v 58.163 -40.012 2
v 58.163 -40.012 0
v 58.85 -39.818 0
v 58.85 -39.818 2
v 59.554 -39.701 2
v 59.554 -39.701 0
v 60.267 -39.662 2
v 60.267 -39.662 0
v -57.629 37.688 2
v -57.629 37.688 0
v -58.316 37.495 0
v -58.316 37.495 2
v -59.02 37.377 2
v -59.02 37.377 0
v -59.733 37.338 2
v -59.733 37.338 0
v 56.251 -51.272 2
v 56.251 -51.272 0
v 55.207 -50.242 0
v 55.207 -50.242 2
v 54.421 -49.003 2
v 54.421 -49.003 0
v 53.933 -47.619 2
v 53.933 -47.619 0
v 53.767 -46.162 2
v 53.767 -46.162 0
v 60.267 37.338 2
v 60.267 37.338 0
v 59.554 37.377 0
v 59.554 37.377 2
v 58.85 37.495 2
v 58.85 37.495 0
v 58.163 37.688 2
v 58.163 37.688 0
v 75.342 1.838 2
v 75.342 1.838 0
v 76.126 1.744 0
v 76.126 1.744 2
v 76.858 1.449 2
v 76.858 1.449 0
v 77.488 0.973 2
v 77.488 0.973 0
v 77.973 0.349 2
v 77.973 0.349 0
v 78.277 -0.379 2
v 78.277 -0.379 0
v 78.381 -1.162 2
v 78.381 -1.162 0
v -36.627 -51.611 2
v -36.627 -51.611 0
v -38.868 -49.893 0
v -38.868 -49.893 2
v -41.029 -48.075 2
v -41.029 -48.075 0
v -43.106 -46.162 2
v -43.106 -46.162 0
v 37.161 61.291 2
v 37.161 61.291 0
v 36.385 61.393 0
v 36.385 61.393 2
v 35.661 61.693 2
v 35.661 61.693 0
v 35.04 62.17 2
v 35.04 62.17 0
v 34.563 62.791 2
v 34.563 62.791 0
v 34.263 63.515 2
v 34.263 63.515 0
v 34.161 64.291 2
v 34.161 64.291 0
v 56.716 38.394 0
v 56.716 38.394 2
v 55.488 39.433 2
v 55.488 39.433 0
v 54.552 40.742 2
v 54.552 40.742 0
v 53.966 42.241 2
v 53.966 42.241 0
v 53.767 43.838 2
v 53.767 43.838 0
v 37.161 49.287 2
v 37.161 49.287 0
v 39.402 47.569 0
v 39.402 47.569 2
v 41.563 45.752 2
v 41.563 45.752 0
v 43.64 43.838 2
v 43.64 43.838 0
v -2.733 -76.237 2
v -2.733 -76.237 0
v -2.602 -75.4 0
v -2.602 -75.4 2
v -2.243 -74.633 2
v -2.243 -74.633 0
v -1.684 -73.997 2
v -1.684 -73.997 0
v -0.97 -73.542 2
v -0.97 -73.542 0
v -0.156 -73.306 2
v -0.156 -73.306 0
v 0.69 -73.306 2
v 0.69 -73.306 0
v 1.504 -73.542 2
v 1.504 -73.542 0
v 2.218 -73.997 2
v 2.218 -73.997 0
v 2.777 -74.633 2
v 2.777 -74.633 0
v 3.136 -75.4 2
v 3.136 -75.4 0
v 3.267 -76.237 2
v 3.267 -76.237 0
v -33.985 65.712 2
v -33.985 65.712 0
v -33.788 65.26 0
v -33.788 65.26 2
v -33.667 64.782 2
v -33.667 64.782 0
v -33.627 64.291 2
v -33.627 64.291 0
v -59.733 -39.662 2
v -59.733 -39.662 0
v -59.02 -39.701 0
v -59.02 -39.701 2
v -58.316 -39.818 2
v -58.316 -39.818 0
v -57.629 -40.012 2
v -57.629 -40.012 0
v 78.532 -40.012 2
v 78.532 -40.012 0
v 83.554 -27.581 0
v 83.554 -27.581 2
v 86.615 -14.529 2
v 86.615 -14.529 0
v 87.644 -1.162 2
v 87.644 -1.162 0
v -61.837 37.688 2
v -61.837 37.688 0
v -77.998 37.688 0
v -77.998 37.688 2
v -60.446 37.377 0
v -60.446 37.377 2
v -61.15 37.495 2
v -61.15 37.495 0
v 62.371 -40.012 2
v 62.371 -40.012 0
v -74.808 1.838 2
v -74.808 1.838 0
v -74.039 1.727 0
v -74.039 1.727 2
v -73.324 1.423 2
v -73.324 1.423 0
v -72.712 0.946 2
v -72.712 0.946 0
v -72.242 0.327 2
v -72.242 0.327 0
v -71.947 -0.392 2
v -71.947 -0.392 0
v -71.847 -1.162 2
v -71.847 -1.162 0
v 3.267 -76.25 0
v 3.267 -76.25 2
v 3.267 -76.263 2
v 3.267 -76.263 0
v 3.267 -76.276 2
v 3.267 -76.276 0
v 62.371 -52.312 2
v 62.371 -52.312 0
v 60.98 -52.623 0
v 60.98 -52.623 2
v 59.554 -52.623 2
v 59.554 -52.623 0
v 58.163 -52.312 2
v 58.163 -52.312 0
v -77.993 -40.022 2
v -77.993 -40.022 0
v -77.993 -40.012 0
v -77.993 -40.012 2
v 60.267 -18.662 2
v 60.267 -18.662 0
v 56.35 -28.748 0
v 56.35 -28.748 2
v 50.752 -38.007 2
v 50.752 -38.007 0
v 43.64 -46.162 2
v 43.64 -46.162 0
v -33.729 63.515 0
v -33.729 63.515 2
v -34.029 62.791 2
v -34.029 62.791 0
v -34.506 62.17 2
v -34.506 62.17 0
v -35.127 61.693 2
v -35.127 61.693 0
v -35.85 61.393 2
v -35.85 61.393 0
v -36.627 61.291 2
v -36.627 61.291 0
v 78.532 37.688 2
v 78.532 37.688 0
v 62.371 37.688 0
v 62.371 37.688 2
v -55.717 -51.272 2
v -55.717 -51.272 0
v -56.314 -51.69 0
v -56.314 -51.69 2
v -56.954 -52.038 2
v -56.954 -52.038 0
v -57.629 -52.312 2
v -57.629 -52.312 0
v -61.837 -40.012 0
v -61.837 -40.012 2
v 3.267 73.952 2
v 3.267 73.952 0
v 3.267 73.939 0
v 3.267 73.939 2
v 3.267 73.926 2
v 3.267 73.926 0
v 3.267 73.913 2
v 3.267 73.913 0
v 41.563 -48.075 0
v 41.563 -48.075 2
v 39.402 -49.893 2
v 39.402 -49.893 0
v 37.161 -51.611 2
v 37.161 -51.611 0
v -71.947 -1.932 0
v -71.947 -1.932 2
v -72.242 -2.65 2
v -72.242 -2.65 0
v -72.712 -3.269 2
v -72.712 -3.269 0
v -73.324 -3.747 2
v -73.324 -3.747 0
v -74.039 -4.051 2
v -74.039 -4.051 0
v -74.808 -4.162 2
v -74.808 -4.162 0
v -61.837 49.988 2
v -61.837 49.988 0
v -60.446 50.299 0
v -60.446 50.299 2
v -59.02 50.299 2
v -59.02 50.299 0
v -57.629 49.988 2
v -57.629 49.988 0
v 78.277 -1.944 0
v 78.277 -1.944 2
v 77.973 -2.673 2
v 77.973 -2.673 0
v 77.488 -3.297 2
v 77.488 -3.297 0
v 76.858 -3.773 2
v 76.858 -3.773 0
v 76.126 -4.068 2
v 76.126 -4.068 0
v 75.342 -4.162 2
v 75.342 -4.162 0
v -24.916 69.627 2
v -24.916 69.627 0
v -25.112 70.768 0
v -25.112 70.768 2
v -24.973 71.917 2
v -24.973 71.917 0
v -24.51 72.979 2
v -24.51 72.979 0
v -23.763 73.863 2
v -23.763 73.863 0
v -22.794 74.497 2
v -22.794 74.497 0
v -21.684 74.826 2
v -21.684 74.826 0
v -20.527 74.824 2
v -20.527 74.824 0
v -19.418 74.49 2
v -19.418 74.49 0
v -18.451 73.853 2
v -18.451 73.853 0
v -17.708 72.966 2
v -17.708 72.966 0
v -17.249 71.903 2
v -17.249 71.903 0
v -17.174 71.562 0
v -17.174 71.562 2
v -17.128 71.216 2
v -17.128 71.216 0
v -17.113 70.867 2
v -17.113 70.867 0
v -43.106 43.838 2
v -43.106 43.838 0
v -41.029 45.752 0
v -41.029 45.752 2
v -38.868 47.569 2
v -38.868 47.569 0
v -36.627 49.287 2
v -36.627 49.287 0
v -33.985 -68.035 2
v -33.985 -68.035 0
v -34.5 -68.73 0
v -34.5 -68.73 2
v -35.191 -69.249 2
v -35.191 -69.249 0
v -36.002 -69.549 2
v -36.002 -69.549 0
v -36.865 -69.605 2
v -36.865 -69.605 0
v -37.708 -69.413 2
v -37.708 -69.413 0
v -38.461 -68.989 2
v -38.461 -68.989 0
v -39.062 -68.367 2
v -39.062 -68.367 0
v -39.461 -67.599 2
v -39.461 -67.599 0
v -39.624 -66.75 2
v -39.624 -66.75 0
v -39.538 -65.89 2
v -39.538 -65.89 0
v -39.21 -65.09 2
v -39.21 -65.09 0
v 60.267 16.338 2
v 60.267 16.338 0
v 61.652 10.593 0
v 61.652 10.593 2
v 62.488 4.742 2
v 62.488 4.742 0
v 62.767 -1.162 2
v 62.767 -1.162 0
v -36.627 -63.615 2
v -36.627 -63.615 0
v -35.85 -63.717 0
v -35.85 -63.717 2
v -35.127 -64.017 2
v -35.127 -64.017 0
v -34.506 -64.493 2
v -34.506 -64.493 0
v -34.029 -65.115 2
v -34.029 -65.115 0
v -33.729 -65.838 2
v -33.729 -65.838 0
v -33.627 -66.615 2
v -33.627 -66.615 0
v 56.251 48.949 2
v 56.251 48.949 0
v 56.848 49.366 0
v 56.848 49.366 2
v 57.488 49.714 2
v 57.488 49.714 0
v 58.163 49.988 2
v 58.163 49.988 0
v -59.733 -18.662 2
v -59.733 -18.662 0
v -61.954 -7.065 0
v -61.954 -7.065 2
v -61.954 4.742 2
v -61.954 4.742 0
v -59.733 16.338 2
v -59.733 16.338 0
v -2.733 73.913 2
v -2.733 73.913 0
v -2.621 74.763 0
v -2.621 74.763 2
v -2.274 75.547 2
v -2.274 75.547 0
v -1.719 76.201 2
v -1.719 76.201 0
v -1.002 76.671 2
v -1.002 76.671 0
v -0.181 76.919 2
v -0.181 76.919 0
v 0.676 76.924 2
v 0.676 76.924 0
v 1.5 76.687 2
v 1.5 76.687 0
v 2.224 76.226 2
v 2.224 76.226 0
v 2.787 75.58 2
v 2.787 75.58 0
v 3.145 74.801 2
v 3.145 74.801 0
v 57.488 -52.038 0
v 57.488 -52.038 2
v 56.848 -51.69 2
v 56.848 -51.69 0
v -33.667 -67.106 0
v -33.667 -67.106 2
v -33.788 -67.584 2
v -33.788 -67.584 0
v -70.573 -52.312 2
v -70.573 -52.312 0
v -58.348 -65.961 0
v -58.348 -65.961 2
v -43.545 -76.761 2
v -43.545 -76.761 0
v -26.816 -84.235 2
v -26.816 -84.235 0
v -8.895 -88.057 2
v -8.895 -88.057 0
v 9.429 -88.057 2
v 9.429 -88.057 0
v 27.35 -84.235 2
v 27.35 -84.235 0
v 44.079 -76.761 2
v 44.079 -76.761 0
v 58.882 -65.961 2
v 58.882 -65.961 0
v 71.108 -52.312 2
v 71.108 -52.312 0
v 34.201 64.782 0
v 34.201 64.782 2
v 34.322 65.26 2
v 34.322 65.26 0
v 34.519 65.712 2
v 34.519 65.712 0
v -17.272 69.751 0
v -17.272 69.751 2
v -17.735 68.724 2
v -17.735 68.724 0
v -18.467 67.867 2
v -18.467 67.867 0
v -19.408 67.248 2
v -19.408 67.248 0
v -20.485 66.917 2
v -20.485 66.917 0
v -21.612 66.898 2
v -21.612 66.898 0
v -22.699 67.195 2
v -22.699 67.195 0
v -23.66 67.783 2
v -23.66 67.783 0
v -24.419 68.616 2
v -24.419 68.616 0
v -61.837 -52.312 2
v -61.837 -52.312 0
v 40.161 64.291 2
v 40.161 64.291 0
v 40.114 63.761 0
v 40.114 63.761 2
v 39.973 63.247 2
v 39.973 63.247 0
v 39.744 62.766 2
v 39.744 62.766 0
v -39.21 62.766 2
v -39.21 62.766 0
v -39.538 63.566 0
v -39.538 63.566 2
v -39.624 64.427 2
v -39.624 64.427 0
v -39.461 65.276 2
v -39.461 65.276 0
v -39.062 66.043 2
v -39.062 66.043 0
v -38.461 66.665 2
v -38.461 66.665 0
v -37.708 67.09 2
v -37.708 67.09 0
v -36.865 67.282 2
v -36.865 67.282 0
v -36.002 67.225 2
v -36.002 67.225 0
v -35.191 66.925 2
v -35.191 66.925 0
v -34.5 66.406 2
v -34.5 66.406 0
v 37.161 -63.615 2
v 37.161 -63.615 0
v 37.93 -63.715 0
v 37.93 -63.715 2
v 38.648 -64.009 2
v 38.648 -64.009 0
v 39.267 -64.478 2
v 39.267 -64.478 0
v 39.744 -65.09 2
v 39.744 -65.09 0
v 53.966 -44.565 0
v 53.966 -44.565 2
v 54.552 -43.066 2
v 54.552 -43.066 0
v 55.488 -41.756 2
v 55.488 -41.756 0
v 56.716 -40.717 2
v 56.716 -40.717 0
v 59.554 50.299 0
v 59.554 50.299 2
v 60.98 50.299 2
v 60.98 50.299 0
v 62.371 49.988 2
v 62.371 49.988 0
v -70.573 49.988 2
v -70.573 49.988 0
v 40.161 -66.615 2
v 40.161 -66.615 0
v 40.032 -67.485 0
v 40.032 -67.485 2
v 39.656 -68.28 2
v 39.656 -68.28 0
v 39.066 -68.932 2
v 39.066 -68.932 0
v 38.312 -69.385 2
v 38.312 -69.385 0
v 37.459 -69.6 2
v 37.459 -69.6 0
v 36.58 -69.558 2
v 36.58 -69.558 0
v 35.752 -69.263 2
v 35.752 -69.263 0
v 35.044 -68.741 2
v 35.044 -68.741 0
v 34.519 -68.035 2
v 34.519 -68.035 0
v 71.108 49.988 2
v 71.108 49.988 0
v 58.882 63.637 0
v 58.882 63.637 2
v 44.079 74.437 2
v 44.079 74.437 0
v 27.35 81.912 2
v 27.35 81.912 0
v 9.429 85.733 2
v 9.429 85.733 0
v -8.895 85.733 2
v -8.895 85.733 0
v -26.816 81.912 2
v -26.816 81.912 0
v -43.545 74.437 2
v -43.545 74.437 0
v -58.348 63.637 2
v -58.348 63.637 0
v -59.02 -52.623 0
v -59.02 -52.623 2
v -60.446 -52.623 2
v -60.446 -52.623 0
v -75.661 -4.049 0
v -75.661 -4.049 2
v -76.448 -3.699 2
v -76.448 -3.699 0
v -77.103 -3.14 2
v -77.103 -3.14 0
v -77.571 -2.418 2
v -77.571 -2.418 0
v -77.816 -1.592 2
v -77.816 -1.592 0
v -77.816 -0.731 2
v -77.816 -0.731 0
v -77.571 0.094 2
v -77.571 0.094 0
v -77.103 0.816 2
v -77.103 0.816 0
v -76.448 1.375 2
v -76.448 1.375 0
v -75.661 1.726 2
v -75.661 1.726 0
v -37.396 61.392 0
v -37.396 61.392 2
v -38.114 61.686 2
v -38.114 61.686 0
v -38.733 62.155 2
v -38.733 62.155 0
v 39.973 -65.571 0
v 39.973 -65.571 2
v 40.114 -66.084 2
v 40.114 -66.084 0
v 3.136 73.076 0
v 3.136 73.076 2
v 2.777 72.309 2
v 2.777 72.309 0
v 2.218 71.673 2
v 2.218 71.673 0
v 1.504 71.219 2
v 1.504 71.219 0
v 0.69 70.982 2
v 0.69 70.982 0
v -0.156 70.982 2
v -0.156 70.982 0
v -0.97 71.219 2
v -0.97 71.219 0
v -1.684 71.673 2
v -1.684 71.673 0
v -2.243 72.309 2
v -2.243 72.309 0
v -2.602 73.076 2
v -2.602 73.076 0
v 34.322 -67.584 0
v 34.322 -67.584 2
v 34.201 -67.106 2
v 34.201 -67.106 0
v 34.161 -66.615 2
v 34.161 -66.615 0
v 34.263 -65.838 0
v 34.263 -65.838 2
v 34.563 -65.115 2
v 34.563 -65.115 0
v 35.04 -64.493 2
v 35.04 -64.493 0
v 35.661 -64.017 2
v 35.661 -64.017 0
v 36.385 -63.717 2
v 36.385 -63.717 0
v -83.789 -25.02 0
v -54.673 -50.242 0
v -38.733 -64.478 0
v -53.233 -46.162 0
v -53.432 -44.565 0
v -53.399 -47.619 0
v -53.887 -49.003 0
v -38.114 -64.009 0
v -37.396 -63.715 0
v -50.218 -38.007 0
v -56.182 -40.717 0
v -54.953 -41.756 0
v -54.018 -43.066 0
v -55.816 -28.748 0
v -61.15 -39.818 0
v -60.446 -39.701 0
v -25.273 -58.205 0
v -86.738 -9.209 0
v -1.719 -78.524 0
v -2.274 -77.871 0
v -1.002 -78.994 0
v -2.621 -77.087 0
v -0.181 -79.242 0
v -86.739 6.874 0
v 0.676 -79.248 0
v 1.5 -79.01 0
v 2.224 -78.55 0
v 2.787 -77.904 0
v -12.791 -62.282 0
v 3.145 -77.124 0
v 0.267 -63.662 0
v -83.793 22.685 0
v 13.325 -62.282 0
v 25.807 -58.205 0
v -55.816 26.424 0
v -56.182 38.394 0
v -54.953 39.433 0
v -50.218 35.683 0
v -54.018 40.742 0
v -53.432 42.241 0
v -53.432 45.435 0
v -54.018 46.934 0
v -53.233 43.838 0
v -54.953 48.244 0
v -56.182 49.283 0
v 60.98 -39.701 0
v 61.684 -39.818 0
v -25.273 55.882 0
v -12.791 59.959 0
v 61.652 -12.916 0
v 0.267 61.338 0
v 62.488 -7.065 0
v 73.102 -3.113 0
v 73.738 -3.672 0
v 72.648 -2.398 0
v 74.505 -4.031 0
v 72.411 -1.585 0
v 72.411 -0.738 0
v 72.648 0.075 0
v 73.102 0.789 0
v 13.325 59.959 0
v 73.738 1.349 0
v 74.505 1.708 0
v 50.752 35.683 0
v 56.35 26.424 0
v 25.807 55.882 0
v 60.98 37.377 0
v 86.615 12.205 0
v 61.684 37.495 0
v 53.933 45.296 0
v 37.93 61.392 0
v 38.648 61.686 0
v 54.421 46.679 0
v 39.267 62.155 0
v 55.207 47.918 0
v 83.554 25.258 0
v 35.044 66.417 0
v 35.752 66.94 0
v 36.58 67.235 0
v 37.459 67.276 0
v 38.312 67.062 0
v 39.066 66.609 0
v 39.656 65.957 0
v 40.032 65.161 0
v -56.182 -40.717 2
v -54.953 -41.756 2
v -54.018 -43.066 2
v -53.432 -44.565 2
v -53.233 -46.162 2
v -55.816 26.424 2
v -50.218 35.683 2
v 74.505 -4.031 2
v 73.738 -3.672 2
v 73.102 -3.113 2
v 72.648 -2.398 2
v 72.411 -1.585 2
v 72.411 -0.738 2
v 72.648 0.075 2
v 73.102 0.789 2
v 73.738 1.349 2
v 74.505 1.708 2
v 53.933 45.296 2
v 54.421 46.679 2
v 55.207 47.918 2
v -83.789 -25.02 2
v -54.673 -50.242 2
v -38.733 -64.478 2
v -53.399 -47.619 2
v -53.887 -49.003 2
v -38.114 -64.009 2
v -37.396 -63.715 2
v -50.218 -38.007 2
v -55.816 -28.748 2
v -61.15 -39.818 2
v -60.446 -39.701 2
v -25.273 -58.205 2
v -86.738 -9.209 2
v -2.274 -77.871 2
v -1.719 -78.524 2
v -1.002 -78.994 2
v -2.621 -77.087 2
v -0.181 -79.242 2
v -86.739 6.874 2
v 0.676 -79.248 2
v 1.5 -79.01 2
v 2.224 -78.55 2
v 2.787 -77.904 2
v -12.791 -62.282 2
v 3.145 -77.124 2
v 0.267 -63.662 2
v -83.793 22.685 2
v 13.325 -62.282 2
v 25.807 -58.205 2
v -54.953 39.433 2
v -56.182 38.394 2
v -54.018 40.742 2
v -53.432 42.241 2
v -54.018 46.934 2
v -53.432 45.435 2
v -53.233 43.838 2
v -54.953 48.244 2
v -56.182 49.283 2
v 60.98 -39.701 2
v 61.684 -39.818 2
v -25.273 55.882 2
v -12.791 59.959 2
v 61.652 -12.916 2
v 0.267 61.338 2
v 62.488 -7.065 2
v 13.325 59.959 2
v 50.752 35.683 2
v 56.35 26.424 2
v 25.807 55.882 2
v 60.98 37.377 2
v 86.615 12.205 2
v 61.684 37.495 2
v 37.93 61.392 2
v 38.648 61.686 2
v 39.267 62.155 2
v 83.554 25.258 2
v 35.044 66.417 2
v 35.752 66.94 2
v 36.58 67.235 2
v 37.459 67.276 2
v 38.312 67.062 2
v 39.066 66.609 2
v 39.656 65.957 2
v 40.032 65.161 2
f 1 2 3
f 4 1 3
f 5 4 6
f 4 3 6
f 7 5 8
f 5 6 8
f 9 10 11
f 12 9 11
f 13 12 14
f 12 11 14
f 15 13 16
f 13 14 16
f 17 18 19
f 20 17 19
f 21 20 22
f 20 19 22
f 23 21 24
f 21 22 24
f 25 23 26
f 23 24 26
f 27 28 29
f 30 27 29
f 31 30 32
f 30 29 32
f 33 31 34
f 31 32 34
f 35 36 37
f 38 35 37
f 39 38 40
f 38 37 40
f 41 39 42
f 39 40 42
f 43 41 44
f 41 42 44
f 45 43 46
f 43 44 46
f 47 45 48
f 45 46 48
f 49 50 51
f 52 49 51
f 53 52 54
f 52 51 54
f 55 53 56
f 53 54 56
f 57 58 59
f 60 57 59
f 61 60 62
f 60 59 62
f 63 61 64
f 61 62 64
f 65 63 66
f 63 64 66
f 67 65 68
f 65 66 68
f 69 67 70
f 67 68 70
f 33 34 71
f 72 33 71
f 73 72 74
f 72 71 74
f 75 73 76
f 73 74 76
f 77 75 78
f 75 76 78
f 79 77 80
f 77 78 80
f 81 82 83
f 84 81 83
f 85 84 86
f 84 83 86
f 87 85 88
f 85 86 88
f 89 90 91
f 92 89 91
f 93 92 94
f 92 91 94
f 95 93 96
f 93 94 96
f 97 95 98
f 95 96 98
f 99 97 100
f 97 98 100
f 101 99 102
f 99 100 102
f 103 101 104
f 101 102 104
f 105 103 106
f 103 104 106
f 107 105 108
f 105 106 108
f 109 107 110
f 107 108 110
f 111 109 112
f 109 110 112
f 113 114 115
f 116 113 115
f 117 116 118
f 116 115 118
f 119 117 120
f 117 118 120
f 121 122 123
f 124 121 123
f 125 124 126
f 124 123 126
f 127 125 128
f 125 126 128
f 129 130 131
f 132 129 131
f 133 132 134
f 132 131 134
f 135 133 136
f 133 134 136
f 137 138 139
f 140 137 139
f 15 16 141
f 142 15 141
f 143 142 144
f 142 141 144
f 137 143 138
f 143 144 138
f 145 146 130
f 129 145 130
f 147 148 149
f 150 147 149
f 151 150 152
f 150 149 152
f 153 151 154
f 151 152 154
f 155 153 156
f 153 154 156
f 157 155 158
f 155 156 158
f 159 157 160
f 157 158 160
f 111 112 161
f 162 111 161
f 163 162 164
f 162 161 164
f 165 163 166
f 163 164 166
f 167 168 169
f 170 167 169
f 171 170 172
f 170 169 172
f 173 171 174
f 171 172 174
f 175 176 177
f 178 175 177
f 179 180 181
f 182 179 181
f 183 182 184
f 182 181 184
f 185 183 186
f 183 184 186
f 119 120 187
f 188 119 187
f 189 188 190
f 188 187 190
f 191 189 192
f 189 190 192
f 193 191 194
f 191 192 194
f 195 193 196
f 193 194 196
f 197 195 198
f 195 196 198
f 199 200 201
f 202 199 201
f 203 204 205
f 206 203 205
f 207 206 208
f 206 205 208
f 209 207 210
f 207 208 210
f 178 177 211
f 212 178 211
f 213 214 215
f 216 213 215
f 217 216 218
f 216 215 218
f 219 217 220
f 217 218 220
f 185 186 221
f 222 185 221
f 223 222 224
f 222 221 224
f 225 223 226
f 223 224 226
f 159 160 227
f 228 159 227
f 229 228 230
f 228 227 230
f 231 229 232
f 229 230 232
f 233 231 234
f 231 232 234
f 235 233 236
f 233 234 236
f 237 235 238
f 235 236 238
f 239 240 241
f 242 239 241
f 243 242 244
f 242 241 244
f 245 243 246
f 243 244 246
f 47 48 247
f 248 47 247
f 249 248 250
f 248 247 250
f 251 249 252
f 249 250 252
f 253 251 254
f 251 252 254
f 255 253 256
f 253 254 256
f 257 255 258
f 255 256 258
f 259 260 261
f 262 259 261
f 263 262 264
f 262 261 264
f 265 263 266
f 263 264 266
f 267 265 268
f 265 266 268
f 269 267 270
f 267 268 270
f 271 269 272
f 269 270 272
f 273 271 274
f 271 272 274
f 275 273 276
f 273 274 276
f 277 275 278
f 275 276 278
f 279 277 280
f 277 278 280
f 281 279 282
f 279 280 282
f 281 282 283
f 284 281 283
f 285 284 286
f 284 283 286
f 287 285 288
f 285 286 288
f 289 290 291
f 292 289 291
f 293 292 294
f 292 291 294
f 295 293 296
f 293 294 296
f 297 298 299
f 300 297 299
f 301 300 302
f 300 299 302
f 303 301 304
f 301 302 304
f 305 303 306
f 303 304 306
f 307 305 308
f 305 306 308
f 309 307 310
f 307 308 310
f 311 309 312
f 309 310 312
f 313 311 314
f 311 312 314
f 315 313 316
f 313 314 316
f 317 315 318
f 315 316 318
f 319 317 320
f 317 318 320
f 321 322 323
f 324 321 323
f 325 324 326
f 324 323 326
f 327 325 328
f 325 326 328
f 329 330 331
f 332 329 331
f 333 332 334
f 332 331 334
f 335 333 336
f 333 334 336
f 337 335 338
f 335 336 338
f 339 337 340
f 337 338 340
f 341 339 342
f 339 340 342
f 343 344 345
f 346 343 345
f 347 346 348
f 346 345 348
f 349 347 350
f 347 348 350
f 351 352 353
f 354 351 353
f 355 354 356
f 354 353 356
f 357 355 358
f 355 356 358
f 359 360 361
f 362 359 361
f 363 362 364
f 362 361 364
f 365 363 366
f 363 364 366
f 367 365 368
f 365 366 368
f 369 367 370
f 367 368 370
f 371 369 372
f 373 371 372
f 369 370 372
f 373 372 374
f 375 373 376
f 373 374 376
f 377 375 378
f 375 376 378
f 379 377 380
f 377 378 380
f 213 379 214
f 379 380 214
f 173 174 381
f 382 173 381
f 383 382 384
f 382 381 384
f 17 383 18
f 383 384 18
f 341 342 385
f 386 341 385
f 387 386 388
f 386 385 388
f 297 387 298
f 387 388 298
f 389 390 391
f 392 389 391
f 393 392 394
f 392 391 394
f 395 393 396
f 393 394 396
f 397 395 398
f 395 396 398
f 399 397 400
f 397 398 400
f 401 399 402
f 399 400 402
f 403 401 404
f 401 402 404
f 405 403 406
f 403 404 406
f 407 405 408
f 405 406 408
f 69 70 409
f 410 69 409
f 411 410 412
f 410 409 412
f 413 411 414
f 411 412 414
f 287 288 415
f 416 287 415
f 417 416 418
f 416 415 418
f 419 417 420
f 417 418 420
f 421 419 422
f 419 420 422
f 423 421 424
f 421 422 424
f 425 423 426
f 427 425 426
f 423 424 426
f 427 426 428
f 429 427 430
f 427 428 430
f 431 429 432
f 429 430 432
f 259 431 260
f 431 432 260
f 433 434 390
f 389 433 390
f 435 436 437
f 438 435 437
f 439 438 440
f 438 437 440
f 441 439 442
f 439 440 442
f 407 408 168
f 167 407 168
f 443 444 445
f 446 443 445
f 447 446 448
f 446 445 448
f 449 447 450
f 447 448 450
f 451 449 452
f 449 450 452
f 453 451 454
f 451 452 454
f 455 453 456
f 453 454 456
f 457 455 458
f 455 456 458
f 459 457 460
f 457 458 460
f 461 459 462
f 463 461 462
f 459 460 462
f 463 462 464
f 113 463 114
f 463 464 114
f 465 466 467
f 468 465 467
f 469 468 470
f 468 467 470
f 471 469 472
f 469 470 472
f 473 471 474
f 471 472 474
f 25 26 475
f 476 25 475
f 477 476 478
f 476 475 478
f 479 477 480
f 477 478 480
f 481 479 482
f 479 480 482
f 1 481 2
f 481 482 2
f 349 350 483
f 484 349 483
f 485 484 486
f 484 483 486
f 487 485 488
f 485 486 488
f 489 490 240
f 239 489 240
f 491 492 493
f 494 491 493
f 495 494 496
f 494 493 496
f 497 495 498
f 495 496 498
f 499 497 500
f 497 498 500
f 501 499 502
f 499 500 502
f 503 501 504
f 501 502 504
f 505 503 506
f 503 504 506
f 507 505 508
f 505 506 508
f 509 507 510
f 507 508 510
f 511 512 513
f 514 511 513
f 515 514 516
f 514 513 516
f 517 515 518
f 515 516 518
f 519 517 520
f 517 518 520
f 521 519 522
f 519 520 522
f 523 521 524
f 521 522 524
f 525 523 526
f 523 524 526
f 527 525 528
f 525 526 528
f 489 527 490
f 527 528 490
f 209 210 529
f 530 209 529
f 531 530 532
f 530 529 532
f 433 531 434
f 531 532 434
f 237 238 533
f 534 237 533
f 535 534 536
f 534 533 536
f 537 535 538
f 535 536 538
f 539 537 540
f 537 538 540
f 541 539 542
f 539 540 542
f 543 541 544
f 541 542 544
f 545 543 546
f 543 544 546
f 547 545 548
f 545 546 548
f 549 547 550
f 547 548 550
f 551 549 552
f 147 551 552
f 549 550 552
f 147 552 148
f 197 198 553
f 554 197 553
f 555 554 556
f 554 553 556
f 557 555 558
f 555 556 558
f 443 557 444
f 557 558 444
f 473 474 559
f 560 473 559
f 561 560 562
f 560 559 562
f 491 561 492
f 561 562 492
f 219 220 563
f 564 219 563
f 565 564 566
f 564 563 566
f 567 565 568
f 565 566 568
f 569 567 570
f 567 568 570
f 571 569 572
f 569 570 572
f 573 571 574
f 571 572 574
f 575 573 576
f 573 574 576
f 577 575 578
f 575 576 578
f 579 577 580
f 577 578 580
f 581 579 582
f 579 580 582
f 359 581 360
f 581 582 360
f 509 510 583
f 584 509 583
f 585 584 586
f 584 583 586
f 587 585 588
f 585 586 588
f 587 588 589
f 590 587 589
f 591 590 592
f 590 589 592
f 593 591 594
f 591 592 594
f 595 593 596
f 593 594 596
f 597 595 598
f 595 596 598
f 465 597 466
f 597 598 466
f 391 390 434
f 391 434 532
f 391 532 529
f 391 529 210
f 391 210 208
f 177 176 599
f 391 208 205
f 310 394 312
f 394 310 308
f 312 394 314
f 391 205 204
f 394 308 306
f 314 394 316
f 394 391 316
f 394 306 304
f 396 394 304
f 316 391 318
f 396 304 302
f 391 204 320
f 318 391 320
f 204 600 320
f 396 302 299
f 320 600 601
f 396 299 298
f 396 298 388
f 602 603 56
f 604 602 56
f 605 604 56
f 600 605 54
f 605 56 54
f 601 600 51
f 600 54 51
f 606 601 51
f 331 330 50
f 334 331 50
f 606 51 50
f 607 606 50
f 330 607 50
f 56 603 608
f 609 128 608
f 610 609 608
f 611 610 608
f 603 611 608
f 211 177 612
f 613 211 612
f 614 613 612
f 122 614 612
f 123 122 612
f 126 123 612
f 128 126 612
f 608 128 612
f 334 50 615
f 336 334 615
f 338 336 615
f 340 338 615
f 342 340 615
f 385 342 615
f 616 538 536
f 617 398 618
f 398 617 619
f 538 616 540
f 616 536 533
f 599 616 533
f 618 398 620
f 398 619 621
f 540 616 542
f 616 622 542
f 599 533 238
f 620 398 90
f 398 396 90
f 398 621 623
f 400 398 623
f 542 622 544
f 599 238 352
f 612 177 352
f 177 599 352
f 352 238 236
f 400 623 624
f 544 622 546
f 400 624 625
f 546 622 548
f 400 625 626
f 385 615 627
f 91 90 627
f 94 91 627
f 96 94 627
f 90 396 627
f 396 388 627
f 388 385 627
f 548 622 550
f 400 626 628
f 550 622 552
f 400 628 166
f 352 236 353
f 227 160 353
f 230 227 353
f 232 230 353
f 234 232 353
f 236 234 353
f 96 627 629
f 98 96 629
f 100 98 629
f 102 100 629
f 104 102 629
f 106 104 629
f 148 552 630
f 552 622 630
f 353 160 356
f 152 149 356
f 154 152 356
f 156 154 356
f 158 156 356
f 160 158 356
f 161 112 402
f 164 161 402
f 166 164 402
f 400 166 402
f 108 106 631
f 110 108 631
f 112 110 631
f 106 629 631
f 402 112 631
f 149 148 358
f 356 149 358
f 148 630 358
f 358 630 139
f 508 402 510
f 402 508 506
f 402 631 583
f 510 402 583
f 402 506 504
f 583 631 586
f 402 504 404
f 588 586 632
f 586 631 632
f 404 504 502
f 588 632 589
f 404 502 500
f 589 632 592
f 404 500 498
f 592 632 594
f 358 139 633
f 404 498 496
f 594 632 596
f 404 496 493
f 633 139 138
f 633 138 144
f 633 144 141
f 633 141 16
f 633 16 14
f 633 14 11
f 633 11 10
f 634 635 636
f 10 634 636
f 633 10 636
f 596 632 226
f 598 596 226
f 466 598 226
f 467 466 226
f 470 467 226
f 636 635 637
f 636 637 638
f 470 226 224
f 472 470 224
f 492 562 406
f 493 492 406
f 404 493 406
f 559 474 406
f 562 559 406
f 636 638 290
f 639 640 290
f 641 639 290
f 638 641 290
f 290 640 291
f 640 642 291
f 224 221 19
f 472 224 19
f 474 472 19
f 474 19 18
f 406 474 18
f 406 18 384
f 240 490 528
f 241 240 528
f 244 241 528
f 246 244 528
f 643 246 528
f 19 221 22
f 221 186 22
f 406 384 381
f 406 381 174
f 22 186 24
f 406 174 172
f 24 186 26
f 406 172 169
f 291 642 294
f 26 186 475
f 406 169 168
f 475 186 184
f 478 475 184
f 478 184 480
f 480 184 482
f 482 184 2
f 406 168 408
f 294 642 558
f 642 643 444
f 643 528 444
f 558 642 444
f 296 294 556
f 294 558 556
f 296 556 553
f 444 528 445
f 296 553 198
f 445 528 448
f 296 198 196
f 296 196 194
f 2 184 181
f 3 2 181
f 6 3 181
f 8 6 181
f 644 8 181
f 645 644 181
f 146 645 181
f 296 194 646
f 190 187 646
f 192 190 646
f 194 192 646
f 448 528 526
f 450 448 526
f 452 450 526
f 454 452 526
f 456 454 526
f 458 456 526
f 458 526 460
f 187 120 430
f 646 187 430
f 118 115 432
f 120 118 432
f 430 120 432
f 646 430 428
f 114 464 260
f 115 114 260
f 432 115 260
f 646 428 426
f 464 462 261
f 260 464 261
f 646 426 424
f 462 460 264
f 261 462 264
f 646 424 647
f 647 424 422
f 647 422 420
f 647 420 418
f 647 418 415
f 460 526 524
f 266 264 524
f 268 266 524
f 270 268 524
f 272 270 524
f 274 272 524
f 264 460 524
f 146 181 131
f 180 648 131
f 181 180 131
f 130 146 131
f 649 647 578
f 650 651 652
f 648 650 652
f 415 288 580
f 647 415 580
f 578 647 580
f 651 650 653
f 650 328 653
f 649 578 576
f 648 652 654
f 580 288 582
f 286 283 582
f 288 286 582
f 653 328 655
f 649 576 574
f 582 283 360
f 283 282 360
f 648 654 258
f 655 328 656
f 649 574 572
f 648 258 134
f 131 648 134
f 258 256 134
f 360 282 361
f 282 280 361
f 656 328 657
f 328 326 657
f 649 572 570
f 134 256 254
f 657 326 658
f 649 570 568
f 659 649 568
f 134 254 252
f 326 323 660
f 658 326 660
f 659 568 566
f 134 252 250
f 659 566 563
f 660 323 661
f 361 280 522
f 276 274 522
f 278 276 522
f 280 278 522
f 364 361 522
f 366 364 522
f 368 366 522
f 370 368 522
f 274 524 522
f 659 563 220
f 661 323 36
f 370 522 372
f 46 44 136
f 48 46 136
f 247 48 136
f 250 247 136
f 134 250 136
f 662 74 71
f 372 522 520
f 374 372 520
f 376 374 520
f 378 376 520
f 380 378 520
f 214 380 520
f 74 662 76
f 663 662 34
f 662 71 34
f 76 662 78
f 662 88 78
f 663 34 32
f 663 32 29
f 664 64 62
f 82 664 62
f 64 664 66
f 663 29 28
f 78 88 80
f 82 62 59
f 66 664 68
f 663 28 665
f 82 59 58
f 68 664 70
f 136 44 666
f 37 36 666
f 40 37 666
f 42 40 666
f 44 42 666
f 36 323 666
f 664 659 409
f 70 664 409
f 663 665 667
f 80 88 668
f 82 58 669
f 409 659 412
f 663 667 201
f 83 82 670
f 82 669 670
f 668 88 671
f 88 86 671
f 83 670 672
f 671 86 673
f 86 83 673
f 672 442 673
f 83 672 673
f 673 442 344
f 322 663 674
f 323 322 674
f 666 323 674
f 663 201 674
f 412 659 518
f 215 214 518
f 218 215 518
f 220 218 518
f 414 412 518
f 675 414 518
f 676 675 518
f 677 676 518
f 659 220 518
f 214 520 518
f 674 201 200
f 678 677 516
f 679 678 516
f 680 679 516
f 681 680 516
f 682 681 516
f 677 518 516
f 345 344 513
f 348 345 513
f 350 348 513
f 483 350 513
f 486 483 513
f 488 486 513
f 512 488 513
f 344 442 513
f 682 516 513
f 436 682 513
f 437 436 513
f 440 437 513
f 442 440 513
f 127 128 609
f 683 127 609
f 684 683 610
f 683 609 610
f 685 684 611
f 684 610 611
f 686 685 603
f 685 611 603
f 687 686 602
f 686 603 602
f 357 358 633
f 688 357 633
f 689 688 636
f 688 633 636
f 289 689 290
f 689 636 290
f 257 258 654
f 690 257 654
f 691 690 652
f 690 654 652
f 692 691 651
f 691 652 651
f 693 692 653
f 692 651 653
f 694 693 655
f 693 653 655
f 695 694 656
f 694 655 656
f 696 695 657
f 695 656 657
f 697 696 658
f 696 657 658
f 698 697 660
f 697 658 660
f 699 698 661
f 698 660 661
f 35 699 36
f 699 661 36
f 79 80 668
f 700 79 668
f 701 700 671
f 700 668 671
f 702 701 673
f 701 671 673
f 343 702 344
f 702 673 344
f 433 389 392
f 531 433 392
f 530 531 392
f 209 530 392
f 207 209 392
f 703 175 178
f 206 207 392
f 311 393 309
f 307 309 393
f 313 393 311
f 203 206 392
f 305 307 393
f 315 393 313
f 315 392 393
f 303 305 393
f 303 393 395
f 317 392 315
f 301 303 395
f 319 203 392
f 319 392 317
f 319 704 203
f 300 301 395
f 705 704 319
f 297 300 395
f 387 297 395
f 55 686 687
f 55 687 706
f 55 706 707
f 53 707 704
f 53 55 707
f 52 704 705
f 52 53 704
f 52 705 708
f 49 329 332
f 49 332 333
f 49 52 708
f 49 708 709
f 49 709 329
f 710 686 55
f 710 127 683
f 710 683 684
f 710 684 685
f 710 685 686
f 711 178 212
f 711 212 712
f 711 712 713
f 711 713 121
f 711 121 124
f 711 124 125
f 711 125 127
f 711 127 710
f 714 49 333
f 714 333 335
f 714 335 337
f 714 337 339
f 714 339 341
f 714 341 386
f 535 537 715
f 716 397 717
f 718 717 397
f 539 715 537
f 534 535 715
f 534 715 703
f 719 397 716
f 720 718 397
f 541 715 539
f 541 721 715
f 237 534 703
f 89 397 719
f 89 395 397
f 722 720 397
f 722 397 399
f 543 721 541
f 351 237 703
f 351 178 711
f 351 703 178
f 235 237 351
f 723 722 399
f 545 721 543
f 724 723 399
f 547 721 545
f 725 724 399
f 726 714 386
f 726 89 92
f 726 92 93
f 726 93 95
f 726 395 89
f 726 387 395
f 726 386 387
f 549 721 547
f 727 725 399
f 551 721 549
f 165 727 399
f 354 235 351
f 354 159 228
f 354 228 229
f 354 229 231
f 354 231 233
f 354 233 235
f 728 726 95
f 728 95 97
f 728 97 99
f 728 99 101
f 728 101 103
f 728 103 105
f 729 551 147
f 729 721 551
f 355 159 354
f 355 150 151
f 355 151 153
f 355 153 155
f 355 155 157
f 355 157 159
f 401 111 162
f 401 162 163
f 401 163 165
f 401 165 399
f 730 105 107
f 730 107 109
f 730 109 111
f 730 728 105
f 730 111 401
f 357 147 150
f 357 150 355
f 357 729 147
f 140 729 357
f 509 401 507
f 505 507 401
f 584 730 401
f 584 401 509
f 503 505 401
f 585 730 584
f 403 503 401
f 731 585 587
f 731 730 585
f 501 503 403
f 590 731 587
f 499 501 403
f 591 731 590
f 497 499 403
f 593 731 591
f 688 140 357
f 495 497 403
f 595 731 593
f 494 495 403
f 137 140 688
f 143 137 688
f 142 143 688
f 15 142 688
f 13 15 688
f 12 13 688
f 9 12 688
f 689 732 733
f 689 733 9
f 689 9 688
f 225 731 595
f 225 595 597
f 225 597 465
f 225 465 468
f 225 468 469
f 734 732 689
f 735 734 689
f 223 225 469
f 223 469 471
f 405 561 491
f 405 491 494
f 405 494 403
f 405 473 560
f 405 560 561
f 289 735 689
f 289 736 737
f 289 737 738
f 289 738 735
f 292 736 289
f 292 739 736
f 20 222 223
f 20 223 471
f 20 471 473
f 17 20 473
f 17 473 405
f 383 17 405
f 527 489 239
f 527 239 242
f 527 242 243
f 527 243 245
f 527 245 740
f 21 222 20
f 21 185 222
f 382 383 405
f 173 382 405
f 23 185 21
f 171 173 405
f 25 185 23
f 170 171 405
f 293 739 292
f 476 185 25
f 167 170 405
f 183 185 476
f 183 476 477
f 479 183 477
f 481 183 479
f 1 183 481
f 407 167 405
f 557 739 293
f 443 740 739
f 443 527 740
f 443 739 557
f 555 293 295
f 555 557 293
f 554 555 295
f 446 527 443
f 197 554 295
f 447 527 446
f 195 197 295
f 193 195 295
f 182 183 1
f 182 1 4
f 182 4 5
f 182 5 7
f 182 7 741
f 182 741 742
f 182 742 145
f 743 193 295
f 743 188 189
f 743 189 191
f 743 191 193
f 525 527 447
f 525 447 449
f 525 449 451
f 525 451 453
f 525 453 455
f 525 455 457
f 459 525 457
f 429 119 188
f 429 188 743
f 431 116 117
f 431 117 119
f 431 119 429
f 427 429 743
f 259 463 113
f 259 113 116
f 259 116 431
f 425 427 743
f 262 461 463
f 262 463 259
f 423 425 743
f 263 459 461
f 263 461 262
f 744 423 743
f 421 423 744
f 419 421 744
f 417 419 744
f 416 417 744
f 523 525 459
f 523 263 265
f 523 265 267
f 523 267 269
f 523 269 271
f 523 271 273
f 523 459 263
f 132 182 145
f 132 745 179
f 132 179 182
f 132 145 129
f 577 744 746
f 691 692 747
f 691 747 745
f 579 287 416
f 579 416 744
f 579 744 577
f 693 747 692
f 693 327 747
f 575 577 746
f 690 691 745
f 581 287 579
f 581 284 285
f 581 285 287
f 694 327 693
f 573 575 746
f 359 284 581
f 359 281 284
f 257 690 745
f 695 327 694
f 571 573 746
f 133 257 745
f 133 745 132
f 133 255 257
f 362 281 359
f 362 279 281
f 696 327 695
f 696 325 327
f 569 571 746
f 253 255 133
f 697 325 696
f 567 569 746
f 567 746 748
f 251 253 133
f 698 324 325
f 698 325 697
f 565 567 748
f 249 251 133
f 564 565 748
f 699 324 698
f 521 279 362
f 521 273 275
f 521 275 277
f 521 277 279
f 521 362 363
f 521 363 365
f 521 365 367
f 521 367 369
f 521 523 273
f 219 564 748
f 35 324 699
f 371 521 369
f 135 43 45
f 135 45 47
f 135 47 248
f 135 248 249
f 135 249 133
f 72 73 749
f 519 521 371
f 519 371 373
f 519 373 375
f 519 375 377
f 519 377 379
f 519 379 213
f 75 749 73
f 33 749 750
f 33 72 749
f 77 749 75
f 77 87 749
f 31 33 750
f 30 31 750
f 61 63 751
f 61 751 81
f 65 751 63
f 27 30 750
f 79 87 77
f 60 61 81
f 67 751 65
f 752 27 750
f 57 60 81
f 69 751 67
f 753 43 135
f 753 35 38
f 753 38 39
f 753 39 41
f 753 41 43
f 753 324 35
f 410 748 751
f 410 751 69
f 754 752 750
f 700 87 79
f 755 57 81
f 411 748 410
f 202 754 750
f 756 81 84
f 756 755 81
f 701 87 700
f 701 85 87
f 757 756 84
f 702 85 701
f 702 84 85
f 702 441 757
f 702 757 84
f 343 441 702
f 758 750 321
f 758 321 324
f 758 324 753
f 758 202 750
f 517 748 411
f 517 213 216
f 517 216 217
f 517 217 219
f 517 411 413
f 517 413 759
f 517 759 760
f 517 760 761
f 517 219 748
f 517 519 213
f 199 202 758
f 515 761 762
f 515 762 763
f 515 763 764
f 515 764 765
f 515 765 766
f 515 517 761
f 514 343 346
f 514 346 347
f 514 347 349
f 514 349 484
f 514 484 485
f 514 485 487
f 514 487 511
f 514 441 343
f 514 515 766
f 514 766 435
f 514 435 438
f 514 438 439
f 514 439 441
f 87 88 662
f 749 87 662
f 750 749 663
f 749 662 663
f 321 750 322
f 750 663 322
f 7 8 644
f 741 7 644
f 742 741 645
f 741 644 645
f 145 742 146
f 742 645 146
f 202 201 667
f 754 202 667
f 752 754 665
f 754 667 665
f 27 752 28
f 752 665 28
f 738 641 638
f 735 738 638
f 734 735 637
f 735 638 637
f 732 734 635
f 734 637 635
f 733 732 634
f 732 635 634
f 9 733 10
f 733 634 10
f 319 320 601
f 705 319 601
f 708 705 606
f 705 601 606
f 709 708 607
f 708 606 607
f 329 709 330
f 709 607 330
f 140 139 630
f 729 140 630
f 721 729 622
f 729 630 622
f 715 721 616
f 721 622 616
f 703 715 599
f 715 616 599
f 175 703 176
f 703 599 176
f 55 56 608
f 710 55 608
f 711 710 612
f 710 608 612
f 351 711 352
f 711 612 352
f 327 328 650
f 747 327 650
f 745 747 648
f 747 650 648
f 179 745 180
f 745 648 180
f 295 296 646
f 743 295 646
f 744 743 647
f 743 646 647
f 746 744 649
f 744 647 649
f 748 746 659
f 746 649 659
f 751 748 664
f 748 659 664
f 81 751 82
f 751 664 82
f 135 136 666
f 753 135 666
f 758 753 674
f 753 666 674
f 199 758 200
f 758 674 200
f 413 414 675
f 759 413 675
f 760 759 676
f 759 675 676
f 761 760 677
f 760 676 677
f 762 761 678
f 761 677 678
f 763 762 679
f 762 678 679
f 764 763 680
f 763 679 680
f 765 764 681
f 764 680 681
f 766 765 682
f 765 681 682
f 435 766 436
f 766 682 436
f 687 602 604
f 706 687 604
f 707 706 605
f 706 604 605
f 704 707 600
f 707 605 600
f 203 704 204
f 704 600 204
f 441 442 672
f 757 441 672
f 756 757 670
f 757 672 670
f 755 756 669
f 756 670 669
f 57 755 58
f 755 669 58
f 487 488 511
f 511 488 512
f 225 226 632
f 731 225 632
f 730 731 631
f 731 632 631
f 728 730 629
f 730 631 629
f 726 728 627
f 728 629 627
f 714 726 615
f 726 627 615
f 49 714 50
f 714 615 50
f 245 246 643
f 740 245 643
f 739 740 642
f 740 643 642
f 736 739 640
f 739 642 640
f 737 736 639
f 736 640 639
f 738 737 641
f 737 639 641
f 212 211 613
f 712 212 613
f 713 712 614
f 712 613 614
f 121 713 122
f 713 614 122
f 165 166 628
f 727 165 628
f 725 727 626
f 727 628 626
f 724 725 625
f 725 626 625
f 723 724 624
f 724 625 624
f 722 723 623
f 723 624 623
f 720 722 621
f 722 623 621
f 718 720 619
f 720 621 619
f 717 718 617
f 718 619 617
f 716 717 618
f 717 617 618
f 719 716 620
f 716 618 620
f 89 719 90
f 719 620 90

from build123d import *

# Parameters (mm, degrees)
F1_DEPTH = 2


with BuildPart() as f1:
    # F0 (on Top) → F1 (new body)
    with BuildSketch(Plane.XY):
        with BuildLine():
            ThreePointArc((39.7444489138, 62.7662374325), (48.4949826486, 56.4517818988), (56.25072261, 48.9489366399))
            ThreePointArc((56.25072261, 48.9489366399), (57.1629943627, 49.5491889391), (58.1628805597, 49.9882449339))
            ThreePointArc((58.1628805597, 49.9882449339), (60.2670431009, 50.3382449339), (62.3712056422, 49.9882449339))
            Line((62.3712056422, 49.9882449339), (71.1075096636, 49.9882449339))
            ThreePointArc((71.1075096636, 49.9882449339), (0.2670431009, 86.2149821287), (-70.5734234617, 49.9882449339))
            Line((-70.5734234617, 49.9882449339), (-61.8371194403, 49.9882449339))
            ThreePointArc((-61.8371194403, 49.9882449339), (-59.7329568991, 50.3382449339), (-57.6287943578, 49.9882449339))
            ThreePointArc((-57.6287943578, 49.9882449339), (-56.6289081608, 49.5491889391), (-55.7166364081, 48.9489366399))
            ThreePointArc((-55.7166364081, 48.9489366399), (-47.9608964467, 56.4517818988), (-39.210362712, 62.7662374325))
            ThreePointArc((-39.210362712, 62.7662374325), (-38.0999813971, 66.9046437634), (-33.9845676129, 65.7118642328))
            ThreePointArc((-33.9845676129, 65.7118642328), (-29.5146570092, 67.8187069008), (-24.9159238599, 69.6271704072))
            ThreePointArc((-24.9159238599, 69.6271704072), (-22.2511598208, 74.7016983457), (-17.2493627904, 71.9028007682))
            ThreePointArc((-17.2493627904, 71.9028007682), (-10.040168129, 73.2628053376), (-2.7327040585, 73.9132428466))
            ThreePointArc((-2.7327040585, 73.9132428466), (0.2475684804, 76.9521280563), (3.2670431009, 73.9521912671))
            ThreePointArc((3.2670431009, 73.9521912671), (3.2669798901, 73.9327166465), (3.2667902604, 73.9132428466))
            ThreePointArc((3.2667902604, 73.9132428466), (19.3387910188, 71.5123271502), (34.5186538148, 65.7118642328))
            ThreePointArc((34.5186538148, 65.7118642328), (37.8934493863, 67.2004280253), (40.1609606052, 64.2912253535))
            ThreePointArc((40.1609606052, 64.2912253535), (40.0549599941, 63.5008029746), (39.7444489138, 62.7662374325))
        make_face()
        with BuildLine():
            Line((-33.6268744033, 64.2912253535), (34.1609606052, 64.2912253535))
            ThreePointArc((34.1609606052, 64.2912253535), (34.2517579334, 65.0237141345), (34.5186538148, 65.7118642328))
            ThreePointArc((34.5186538148, 65.7118642328), (19.3387910188, 71.5123271502), (3.2667902604, 73.9132428466))
            ThreePointArc((3.2667902604, 73.9132428466), (0.2670431009, 70.9521912671), (-2.7327040585, 73.9132428466))
            ThreePointArc((-2.7327040585, 73.9132428466), (-10.040168129, 73.2628053376), (-17.2493627904, 71.9028007682))
            ThreePointArc((-17.2493627904, 71.9028007682), (-17.1471933384, 71.3894027327), (-17.1129413209, 70.8670590345))
            ThreePointArc((-17.1129413209, 70.8670590345), (-20.4852193108, 66.9166204414), (-24.9159238599, 69.6271704072))
            ThreePointArc((-24.9159238599, 69.6271704072), (-29.5146570092, 67.8187069008), (-33.9845676129, 65.7118642328))
            ThreePointArc((-33.9845676129, 65.7118642328), (-33.7176717315, 65.0237141345), (-33.6268744033, 64.2912253535))
        make_face()
        with BuildLine():
            ThreePointArc((-36.6268744033, 49.2871185703), (0.2670431009, 61.3382449339), (37.1609606052, 49.2871185703))
            Line((37.1609606052, 49.2871185703), (37.1609606052, 61.2912253535))
            ThreePointArc((37.1609606052, 61.2912253535), (35.0396402617, 62.1699050099), (34.1609606052, 64.2912253535))
            Line((34.1609606052, 64.2912253535), (-33.6268744033, 64.2912253535))
            ThreePointArc((-33.6268744033, 64.2912253535), (-34.5055540598, 62.1699050099), (-36.6268744033, 61.2912253535))
            Line((-36.6268744033, 61.2912253535), (-36.6268744033, 49.2871185703))
        make_face()
        with BuildLine():
            ThreePointArc((-43.1063358313, 43.8382449339), (-39.9589718059, 46.6725184699), (-36.6268744033, 49.2871185703))
            Line((-36.6268744033, 49.2871185703), (-36.6268744033, 61.2912253535))
            ThreePointArc((-36.6268744033, 61.2912253535), (-38.1143279719, 61.6859457367), (-39.210362712, 62.7662374325))
            ThreePointArc((-39.210362712, 62.7662374325), (-47.9608964467, 56.4517818988), (-55.7166364081, 48.9489366399))
            ThreePointArc((-55.7166364081, 48.9489366399), (-53.8867579976, 46.6793641507), (-53.2329568991, 43.8382449339))
            Line((-53.2329568991, 43.8382449339), (-43.1063358313, 43.8382449339))
        make_face()
        with BuildLine():
            ThreePointArc((-59.7329568991, 16.3382449339), (-53.217313191, 31.1751222109), (-43.1063358313, 43.8382449339))
            Line((-43.1063358313, 43.8382449339), (-53.2329568991, 43.8382449339))
            ThreePointArc((-53.2329568991, 43.8382449339), (-54.4449016555, 40.0585000032), (-57.6287943578, 37.6882449339))
            ThreePointArc((-57.6287943578, 37.6882449339), (-58.6664204487, 37.4263419402), (-59.7329568991, 37.3382449339))
            Line((-59.7329568991, 37.3382449339), (-59.7329568991, 16.3382449339))
        make_face()
        with BuildLine():
            ThreePointArc((-59.7329568991, -18.6617550661), (-62.2329568991, -1.1617550661), (-59.7329568991, 16.3382449339))
            Line((-59.7329568991, 16.3382449339), (-59.7329568991, 37.3382449339))
            ThreePointArc((-59.7329568991, 37.3382449339), (-60.7994933494, 37.4263419402), (-61.8371194403, 37.6882449339))
            Line((-61.8371194403, 37.6882449339), (-64.0441635012, 37.6882449339))
            ThreePointArc((-64.0441635012, 37.6882449339), (-71.6943261151, 20.4441500334), (-74.8079548118, 1.8379920933))
            ThreePointArc((-74.8079548118, 1.8379920933), (-72.7118569492, 0.9457499444), (-71.8469032323, -1.1617550661))
            ThreePointArc((-71.8469032323, -1.1617550661), (-72.7118569492, -3.2692600767), (-74.8079548118, -4.1615022256))
            ThreePointArc((-74.8079548118, -4.1615022256), (-71.6943261151, -22.7676601657), (-64.0441635012, -40.0117550661))
            Line((-64.0441635012, -40.0117550661), (-61.8371194403, -40.0117550661))
            ThreePointArc((-61.8371194403, -40.0117550661), (-60.7994933494, -39.7498520725), (-59.7329568991, -39.6617550661))
            Line((-59.7329568991, -39.6617550661), (-59.7329568991, -18.6617550661))
        make_face()
        with BuildLine():
            Line((-64.0441635012, 37.6882449339), (-77.9977107977, 37.6882449339))
            ThreePointArc((-77.9977107977, 37.6882449339), (-87.1096939106, -1.1674142446), (-77.9926777014, -40.0218927752))
            Line((-77.9926777014, -40.0218927752), (-77.9926777014, -40.0117550661))
            Line((-77.9926777014, -40.0117550661), (-64.0441635012, -40.0117550661))
            ThreePointArc((-64.0441635012, -40.0117550661), (-71.6943261151, -22.7676601657), (-74.8079548118, -4.1615022256))
            ThreePointArc((-74.8079548118, -4.1615022256), (-77.8469032323, -1.1617550661), (-74.8079548118, 1.8379920933))
            ThreePointArc((-74.8079548118, 1.8379920933), (-71.6943261151, 20.4441500334), (-64.0441635012, 37.6882449339))
        make_face()
        with BuildLine():
            Line((43.6404220332, 43.8382449339), (53.7670431009, 43.8382449339))
            ThreePointArc((53.7670431009, 43.8382449339), (54.4208441995, 46.6793641507), (56.25072261, 48.9489366399))
            ThreePointArc((56.25072261, 48.9489366399), (48.4949826486, 56.4517818988), (39.7444489138, 62.7662374325))
            ThreePointArc((39.7444489138, 62.7662374325), (38.6484141737, 61.6859457367), (37.1609606052, 61.2912253535))
            Line((37.1609606052, 61.2912253535), (37.1609606052, 49.2871185703))
            ThreePointArc((37.1609606052, 49.2871185703), (40.4930580078, 46.6725184699), (43.6404220332, 43.8382449339))
        make_face()
        with BuildLine():
            ThreePointArc((58.1628805597, 37.6882449339), (54.9789878574, 40.0585000032), (53.7670431009, 43.8382449339))
            Line((53.7670431009, 43.8382449339), (43.6404220332, 43.8382449339))
            ThreePointArc((43.6404220332, 43.8382449339), (53.7513993929, 31.1751222109), (60.2670431009, 16.3382449339))
            Line((60.2670431009, 16.3382449339), (60.2670431009, 37.3382449339))
            ThreePointArc((60.2670431009, 37.3382449339), (59.2005066506, 37.4263419402), (58.1628805597, 37.6882449339))
        make_face()
        with BuildLine():
            ThreePointArc((62.3712056422, 37.6882449339), (61.3335795513, 37.4263419402), (60.2670431009, 37.3382449339))
            Line((60.2670431009, 37.3382449339), (60.2670431009, 16.3382449339))
            ThreePointArc((60.2670431009, 16.3382449339), (62.1388864548, 7.6770796987), (62.7670431009, -1.1617550661))
            ThreePointArc((62.7670431009, -1.1617550661), (62.1388864548, -10.000589831), (60.2670431009, -18.6617550661))
            Line((60.2670431009, -18.6617550661), (60.2670431009, -39.6617550661))
            ThreePointArc((60.2670431009, -39.6617550661), (61.3335795513, -39.7498520725), (62.3712056422, -40.0117550661))
            Line((62.3712056422, -40.0117550661), (64.5782497031, -40.0117550661))
            ThreePointArc((64.5782497031, -40.0117550661), (72.228412317, -22.7676601657), (75.3420410137, -4.1615022256))
            ThreePointArc((75.3420410137, -4.1615022256), (72.3809894341, -1.1617550661), (75.3420410137, 1.8379920933))
            ThreePointArc((75.3420410137, 1.8379920933), (72.228412317, 20.4441500334), (64.5782497031, 37.6882449339))
            Line((64.5782497031, 37.6882449339), (62.3712056422, 37.6882449339))
        make_face()
        with BuildLine():
            Line((78.5317969996, 37.6882449339), (64.5782497031, 37.6882449339))
            ThreePointArc((64.5782497031, 37.6882449339), (72.228412317, 20.4441500334), (75.3420410137, 1.8379920933))
            ThreePointArc((75.3420410137, 1.8379920933), (77.4884944447, 0.9732912169), (78.3809894341, -1.1617550661))
            ThreePointArc((78.3809894341, -1.1617550661), (77.4884944447, -3.2968013492), (75.3420410137, -4.1615022256))
            ThreePointArc((75.3420410137, -4.1615022256), (72.228412317, -22.7676601657), (64.5782497031, -40.0117550661))
            Line((64.5782497031, -40.0117550661), (78.5317969996, -40.0117550661))
            ThreePointArc((78.5317969996, -40.0117550661), (85.3352893384, -21.1138899118), (87.6437802958, -1.1617550661))
            ThreePointArc((87.6437802958, -1.1617550661), (85.3352893384, 18.7903797795), (78.5317969996, 37.6882449339))
        make_face()
        with BuildLine():
            Line((60.2670431009, -39.6617550661), (60.2670431009, -18.6617550661))
            ThreePointArc((60.2670431009, -18.6617550661), (53.7513993929, -33.4986323432), (43.6404220332, -46.1617550661))
            Line((43.6404220332, -46.1617550661), (53.7670431009, -46.1617550661))
            ThreePointArc((53.7670431009, -46.1617550661), (54.9789878574, -42.3820101355), (58.1628805597, -40.0117550661))
            ThreePointArc((58.1628805597, -40.0117550661), (59.2005066506, -39.7498520725), (60.2670431009, -39.6617550661))
        make_face()
        with BuildLine():
            Line((53.7670431009, -46.1617550661), (43.6404220332, -46.1617550661))
            ThreePointArc((43.6404220332, -46.1617550661), (40.4930580078, -48.9960286021), (37.1609606052, -51.6106287026))
            Line((37.1609606052, -51.6106287026), (37.1609606052, -63.6147354858))
            ThreePointArc((37.1609606052, -63.6147354858), (38.6484141737, -64.009455869), (39.7444489138, -65.0897475648))
            ThreePointArc((39.7444489138, -65.0897475648), (48.4949826486, -58.7752920311), (56.25072261, -51.2724467721))
            ThreePointArc((56.25072261, -51.2724467721), (54.4208441995, -49.002874283), (53.7670431009, -46.1617550661))
        make_face()
        with BuildLine():
            ThreePointArc((58.1628805597, -52.3117550661), (57.1629943627, -51.8726990713), (56.25072261, -51.2724467721))
            ThreePointArc((56.25072261, -51.2724467721), (48.4949826486, -58.7752920311), (39.7444489138, -65.0897475648))
            ThreePointArc((39.7444489138, -65.0897475648), (40.0549599941, -65.8243131069), (40.1609606052, -66.6147354858))
            ThreePointArc((40.1609606052, -66.6147354858), (37.8934493863, -69.5239381576), (34.5186538148, -68.035374365))
            ThreePointArc((34.5186538148, -68.035374365), (19.3387910188, -73.8358372824), (3.2667902604, -76.2367529789))
            ThreePointArc((3.2667902604, -76.2367529789), (3.2669798901, -76.2562267788), (3.2670431009, -76.2757013993))
            ThreePointArc((3.2670431009, -76.2757013993), (0.2475684804, -79.2756381885), (-2.7327040585, -76.2367529789))
            ThreePointArc((-2.7327040585, -76.2367529789), (-18.8047048169, -73.8358372824), (-33.9845676129, -68.035374365))
            ThreePointArc((-33.9845676129, -68.035374365), (-38.0999813971, -69.2281538956), (-39.210362712, -65.0897475648))
            ThreePointArc((-39.210362712, -65.0897475648), (-47.9608964467, -58.7752920311), (-55.7166364081, -51.2724467721))
            ThreePointArc((-55.7166364081, -51.2724467721), (-56.6289081608, -51.8726990713), (-57.6287943578, -52.3117550661))
            ThreePointArc((-57.6287943578, -52.3117550661), (-59.7329568991, -52.6617550661), (-61.8371194403, -52.3117550661))
            Line((-61.8371194403, -52.3117550661), (-70.5734234617, -52.3117550661))
            ThreePointArc((-70.5734234617, -52.3117550661), (0.2670431009, -88.538492261), (71.1075096636, -52.3117550661))
            Line((71.1075096636, -52.3117550661), (62.3712056422, -52.3117550661))
            ThreePointArc((62.3712056422, -52.3117550661), (60.2670431009, -52.6617550661), (58.1628805597, -52.3117550661))
        make_face()
        with BuildLine():
            Line((37.1609606052, -63.6147354858), (37.1609606052, -51.6106287026))
            ThreePointArc((37.1609606052, -51.6106287026), (0.2670431009, -63.6617550661), (-36.6268744033, -51.6106287026))
            Line((-36.6268744033, -51.6106287026), (-36.6268744033, -63.6147354858))
            ThreePointArc((-36.6268744033, -63.6147354858), (-34.5055540598, -64.4934151422), (-33.6268744033, -66.6147354858))
            Line((-33.6268744033, -66.6147354858), (34.1609606052, -66.6147354858))
            ThreePointArc((34.1609606052, -66.6147354858), (35.0396402617, -64.4934151422), (37.1609606052, -63.6147354858))
        make_face()
        with BuildLine():
            ThreePointArc((34.5186538148, -68.035374365), (34.2517579334, -67.3472242668), (34.1609606052, -66.6147354858))
            Line((34.1609606052, -66.6147354858), (-33.6268744033, -66.6147354858))
            ThreePointArc((-33.6268744033, -66.6147354858), (-33.7176717315, -67.3472242668), (-33.9845676129, -68.035374365))
            ThreePointArc((-33.9845676129, -68.035374365), (-18.8047048169, -73.8358372824), (-2.7327040585, -76.2367529789))
            ThreePointArc((-2.7327040585, -76.2367529789), (0.2670431009, -73.2757013993), (3.2667902604, -76.2367529789))
            ThreePointArc((3.2667902604, -76.2367529789), (19.3387910188, -73.8358372824), (34.5186538148, -68.035374365))
        make_face()
        with BuildLine():
            ThreePointArc((-36.6268744033, -51.6106287026), (-39.9589718059, -48.9960286021), (-43.1063358313, -46.1617550661))
            Line((-43.1063358313, -46.1617550661), (-53.2329568991, -46.1617550661))
            ThreePointArc((-53.2329568991, -46.1617550661), (-53.8867579976, -49.002874283), (-55.7166364081, -51.2724467721))
            ThreePointArc((-55.7166364081, -51.2724467721), (-47.9608964467, -58.7752920311), (-39.210362712, -65.0897475648))
            ThreePointArc((-39.210362712, -65.0897475648), (-38.1143279719, -64.009455869), (-36.6268744033, -63.6147354858))
            Line((-36.6268744033, -63.6147354858), (-36.6268744033, -51.6106287026))
        make_face()
        with BuildLine():
            Line((-53.2329568991, -46.1617550661), (-43.1063358313, -46.1617550661))
            ThreePointArc((-43.1063358313, -46.1617550661), (-53.217313191, -33.4986323432), (-59.7329568991, -18.6617550661))
            Line((-59.7329568991, -18.6617550661), (-59.7329568991, -39.6617550661))
            ThreePointArc((-59.7329568991, -39.6617550661), (-58.6664204487, -39.7498520725), (-57.6287943578, -40.0117550661))
            ThreePointArc((-57.6287943578, -40.0117550661), (-54.4449016555, -42.3820101355), (-53.2329568991, -46.1617550661))
        make_face()
    extrude(amount=F1_DEPTH)


solid = f1.part
